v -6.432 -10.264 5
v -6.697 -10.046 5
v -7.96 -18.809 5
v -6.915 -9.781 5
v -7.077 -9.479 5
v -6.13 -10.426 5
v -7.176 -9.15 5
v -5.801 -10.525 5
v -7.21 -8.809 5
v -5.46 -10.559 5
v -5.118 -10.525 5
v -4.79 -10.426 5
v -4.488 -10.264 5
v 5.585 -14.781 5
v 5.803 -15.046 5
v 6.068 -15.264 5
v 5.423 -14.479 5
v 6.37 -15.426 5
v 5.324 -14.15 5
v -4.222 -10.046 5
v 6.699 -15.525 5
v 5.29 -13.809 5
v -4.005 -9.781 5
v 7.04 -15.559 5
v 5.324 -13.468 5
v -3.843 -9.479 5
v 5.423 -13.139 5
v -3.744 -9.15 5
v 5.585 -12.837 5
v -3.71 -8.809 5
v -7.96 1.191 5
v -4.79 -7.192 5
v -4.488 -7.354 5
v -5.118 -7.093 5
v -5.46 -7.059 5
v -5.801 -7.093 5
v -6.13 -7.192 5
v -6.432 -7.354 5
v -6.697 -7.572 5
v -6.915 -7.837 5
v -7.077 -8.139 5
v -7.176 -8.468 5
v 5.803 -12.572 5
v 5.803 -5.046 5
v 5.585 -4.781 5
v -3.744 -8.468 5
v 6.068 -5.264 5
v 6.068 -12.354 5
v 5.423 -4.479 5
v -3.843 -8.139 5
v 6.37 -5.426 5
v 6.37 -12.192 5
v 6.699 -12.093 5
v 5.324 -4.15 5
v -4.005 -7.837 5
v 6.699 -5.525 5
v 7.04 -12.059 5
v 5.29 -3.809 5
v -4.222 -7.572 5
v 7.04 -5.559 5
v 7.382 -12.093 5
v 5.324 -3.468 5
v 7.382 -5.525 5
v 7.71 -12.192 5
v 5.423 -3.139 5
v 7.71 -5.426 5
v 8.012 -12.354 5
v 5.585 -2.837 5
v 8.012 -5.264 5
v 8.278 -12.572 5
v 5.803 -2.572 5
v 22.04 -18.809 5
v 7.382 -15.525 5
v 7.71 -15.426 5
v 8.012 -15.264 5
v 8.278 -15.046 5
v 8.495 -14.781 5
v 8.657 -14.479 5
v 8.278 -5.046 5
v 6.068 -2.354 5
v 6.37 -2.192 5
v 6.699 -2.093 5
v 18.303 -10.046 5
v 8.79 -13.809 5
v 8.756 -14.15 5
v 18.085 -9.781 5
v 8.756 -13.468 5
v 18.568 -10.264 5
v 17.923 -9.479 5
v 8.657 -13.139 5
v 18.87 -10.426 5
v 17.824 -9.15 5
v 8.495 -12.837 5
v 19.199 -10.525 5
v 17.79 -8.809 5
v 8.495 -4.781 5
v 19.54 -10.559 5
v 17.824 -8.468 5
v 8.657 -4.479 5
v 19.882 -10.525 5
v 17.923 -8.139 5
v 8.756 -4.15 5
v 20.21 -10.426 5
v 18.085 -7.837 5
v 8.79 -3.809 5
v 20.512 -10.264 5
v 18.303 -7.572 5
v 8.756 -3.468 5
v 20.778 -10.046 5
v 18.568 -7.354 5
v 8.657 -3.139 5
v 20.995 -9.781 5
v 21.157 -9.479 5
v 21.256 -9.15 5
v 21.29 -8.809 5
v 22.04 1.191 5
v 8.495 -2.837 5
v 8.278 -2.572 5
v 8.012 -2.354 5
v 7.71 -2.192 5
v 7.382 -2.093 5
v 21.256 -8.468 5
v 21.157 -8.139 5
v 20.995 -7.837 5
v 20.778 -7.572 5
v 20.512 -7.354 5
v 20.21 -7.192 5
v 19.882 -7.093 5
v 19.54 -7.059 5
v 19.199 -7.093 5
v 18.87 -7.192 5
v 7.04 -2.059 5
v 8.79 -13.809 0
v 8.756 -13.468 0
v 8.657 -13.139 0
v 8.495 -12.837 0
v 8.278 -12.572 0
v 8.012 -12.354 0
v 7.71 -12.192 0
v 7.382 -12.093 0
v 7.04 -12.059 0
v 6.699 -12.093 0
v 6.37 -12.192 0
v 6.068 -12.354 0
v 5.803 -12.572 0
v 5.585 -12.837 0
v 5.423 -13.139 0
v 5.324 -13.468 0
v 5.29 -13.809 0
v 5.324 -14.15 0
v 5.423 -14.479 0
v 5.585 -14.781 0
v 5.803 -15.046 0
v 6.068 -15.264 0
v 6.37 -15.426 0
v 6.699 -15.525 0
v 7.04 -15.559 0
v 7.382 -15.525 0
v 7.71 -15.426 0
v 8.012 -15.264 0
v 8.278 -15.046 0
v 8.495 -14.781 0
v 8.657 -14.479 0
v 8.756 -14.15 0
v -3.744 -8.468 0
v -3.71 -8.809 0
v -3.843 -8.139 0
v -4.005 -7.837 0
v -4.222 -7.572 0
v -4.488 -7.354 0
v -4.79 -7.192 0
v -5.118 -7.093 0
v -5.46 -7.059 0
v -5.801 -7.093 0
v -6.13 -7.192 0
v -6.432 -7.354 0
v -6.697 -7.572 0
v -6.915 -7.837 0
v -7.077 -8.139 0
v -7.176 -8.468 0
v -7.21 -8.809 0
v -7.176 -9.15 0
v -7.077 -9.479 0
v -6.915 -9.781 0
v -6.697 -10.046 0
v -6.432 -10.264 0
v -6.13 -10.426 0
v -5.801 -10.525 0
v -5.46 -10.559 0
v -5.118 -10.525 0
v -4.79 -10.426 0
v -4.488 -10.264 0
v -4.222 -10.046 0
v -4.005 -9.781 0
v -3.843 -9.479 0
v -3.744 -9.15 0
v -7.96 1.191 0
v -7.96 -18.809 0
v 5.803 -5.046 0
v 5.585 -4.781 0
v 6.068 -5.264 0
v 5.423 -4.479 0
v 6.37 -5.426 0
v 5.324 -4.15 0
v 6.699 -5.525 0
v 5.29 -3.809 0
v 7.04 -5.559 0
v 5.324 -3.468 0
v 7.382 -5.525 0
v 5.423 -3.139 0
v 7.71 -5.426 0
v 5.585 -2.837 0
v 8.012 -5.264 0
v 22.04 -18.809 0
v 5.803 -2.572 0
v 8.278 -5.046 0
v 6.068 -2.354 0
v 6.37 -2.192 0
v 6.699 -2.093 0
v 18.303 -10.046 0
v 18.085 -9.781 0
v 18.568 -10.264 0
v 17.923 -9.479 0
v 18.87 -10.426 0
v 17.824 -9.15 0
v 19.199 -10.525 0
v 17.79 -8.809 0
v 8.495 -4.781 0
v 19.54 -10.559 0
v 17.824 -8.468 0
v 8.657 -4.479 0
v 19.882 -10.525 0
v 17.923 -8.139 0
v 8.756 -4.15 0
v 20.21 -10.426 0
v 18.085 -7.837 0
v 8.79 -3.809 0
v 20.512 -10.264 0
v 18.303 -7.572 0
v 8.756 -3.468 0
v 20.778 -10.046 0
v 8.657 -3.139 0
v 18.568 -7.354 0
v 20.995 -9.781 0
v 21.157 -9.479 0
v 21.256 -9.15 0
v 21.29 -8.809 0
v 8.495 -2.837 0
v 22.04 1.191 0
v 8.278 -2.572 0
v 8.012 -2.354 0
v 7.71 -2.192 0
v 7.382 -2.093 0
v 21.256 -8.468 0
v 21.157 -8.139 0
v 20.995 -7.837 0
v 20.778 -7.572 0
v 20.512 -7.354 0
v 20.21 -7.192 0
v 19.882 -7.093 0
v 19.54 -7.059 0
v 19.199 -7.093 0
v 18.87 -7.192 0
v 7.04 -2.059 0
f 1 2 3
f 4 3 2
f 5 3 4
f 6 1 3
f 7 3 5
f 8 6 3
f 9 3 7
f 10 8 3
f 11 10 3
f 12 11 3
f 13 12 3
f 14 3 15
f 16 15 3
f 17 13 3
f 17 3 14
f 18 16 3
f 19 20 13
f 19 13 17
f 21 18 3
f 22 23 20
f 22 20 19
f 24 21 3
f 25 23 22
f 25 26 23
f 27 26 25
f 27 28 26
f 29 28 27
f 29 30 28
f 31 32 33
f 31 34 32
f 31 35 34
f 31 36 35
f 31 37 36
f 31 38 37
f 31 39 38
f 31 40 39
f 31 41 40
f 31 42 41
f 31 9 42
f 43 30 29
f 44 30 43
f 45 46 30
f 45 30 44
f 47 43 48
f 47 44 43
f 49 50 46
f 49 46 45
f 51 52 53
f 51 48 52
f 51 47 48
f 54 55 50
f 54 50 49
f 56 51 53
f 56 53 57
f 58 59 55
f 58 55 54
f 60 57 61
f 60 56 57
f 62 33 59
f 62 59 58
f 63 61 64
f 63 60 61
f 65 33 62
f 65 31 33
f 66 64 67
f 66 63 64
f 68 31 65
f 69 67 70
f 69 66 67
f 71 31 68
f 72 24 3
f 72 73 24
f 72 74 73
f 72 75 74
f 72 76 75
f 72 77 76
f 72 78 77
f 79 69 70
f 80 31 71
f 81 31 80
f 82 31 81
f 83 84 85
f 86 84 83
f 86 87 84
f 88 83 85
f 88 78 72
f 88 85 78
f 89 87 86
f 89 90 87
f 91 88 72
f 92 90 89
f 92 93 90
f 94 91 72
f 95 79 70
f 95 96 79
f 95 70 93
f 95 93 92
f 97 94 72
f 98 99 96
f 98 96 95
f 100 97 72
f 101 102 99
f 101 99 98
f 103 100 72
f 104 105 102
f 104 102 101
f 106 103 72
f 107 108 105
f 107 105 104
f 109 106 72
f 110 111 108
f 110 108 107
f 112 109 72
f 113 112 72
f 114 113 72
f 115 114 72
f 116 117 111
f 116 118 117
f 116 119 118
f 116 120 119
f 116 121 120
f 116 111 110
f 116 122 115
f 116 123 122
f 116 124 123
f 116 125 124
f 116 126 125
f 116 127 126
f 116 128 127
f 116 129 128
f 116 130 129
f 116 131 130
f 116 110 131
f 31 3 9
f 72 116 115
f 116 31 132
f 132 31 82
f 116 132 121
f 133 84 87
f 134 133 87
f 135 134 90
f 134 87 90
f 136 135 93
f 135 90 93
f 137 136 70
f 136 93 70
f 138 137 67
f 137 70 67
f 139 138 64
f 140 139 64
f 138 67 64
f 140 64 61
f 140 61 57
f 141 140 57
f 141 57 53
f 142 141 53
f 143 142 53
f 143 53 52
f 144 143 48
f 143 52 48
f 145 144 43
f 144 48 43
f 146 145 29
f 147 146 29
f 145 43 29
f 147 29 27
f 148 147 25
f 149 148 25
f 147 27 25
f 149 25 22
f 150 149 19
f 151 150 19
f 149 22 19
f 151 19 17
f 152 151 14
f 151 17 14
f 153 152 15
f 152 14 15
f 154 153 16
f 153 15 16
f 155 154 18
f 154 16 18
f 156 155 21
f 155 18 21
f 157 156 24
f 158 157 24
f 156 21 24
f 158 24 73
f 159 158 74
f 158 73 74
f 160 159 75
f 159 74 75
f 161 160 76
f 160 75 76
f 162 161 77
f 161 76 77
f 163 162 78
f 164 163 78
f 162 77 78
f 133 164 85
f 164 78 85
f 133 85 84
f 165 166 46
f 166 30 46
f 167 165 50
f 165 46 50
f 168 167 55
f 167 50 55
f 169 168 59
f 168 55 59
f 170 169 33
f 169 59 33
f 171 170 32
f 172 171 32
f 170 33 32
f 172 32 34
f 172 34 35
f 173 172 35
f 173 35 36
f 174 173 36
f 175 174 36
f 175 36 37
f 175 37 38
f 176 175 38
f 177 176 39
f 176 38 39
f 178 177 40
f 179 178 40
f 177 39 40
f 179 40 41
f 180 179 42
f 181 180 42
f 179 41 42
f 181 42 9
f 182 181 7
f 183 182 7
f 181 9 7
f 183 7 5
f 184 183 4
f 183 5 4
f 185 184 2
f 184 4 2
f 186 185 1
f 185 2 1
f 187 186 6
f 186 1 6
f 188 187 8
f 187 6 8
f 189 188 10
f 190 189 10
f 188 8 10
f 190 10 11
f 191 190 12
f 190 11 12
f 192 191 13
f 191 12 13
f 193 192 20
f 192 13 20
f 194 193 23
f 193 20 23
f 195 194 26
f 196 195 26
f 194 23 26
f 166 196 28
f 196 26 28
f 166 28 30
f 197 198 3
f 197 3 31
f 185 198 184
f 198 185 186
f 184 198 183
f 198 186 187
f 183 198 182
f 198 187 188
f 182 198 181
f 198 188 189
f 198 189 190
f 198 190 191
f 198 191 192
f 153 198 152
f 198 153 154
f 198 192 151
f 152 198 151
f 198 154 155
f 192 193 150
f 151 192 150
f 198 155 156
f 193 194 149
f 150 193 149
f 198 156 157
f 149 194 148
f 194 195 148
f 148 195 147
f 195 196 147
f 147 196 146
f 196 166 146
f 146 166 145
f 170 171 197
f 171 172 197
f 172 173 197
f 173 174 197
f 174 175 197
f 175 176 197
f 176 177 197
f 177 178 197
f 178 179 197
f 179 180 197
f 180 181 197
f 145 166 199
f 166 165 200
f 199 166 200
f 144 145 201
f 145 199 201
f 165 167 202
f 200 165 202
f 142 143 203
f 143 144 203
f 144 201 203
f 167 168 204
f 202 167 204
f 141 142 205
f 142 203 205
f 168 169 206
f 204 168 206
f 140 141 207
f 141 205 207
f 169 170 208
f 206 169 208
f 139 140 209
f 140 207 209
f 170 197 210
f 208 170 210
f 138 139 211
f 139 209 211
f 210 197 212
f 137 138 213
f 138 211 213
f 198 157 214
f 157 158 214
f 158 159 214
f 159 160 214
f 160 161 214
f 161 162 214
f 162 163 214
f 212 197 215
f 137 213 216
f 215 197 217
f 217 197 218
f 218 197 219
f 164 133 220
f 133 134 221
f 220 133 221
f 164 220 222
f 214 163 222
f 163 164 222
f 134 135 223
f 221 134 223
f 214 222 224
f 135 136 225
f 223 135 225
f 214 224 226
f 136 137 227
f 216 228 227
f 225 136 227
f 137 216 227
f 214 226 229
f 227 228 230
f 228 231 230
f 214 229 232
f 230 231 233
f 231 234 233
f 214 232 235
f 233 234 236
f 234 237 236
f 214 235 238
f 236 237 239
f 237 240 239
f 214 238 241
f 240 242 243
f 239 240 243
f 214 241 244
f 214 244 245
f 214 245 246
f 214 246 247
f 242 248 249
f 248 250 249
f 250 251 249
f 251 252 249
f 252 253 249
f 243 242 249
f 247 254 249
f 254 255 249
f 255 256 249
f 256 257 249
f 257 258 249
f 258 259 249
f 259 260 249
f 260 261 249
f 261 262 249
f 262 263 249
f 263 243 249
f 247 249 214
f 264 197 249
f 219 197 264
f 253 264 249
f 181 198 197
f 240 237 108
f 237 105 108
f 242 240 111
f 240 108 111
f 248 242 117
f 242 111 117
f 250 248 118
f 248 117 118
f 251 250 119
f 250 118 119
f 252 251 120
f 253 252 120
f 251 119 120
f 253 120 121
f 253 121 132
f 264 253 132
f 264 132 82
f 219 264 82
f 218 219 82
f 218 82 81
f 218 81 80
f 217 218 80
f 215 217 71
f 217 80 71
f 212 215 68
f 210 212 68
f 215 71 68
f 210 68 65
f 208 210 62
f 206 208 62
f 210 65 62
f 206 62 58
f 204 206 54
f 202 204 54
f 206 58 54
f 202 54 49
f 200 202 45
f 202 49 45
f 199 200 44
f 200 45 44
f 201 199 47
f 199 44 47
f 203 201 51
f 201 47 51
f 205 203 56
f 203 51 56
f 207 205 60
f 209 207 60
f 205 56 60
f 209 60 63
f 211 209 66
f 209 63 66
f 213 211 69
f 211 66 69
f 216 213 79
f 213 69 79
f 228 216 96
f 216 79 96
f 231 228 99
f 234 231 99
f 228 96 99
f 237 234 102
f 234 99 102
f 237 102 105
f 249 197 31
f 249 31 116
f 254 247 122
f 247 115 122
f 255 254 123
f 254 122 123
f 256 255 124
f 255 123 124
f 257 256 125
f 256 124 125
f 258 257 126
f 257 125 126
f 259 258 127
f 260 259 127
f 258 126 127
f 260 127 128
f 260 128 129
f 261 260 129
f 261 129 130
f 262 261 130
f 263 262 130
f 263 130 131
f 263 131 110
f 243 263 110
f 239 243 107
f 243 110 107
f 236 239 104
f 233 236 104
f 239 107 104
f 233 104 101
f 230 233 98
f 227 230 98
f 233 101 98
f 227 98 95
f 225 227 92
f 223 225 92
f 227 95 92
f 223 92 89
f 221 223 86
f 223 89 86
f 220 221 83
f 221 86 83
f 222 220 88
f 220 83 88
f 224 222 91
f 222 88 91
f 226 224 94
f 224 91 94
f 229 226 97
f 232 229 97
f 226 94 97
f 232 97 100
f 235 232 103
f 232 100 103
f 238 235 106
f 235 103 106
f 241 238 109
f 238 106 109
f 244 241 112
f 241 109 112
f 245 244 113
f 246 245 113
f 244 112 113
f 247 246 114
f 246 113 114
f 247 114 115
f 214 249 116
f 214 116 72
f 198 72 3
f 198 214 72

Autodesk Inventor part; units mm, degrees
ref_plane "YZ Plane" through (0, 0, 0) normal (1, 0, 0) x (0, 1, 0)
ref_plane "XZ Plane" through (0, 0, 0) normal (0, 1, 0) x (-1, 0, 0)
ref_plane "XY Plane" through (0, 0, 0) normal (0, 0, 1) x (1, 0, 0)
sketch "Boceto1" plane through (0, 0, 0) normal (0, 0, 1) x (1, 0, 0)
  line L0 (-7.9599, 1.191) -> (22.0401, 1.191)
  line L1 (22.0401, 1.191) -> (22.0401, -18.809)
  line L2 (22.0401, -18.809) -> (-7.9599, -18.809)
  line L3 (-7.9599, -18.809) -> (-7.9599, 1.191)
  point P0 (0, 0)
  dimension "d0" = 20
  dimension "d10" = 30
extrude "Extrusión1" add sketch "Boceto1" along normal blind 5
sketch "Boceto2" plane through (0, 0, 5) normal (0, 0, 1) x (1, 0, 0)
  line L0 (22.0401, 1.191) -> (22.0401, -18.809) projected
  line L1 (-7.9599, -18.809) -> (-7.9599, 1.191) projected
  line L2 (22.0401, -18.809) -> (-7.9599, -18.809) projected
  circle A0 centre (-5.4599, -8.809) radius 1.75
  circle A1 centre (19.5401, -8.809) radius 1.75
  point P0 (0, 0)
  dimension "d3" = 3.5
  dimension "d4" = 2.5
  dimension "d5" = 2.5
  dimension "d6" = 10
  dimension "d7" = 10
extrude "Extrusión2" cut sketch "Boceto2" against normal blind 5
sketch "Boceto3" plane through (0, 0, 5) normal (0, 0, 1) x (1, 0, 0)
  line L0 (-7.9599, 1.191) -> (22.0401, 1.191) projected
  line L1 (22.0401, -18.809) -> (-7.9599, -18.809) projected
  circle A0 centre (7.0401, -3.809) radius 1.75
  circle A1 centre (7.0401, -13.809) radius 1.75
  point P0 (0, 0)
  dimension "d11" = 5
  dimension "d12" = 5
extrude "Extrusión3" cut sketch "Boceto3" against normal blind 5
properties part number "tapa polea x"
